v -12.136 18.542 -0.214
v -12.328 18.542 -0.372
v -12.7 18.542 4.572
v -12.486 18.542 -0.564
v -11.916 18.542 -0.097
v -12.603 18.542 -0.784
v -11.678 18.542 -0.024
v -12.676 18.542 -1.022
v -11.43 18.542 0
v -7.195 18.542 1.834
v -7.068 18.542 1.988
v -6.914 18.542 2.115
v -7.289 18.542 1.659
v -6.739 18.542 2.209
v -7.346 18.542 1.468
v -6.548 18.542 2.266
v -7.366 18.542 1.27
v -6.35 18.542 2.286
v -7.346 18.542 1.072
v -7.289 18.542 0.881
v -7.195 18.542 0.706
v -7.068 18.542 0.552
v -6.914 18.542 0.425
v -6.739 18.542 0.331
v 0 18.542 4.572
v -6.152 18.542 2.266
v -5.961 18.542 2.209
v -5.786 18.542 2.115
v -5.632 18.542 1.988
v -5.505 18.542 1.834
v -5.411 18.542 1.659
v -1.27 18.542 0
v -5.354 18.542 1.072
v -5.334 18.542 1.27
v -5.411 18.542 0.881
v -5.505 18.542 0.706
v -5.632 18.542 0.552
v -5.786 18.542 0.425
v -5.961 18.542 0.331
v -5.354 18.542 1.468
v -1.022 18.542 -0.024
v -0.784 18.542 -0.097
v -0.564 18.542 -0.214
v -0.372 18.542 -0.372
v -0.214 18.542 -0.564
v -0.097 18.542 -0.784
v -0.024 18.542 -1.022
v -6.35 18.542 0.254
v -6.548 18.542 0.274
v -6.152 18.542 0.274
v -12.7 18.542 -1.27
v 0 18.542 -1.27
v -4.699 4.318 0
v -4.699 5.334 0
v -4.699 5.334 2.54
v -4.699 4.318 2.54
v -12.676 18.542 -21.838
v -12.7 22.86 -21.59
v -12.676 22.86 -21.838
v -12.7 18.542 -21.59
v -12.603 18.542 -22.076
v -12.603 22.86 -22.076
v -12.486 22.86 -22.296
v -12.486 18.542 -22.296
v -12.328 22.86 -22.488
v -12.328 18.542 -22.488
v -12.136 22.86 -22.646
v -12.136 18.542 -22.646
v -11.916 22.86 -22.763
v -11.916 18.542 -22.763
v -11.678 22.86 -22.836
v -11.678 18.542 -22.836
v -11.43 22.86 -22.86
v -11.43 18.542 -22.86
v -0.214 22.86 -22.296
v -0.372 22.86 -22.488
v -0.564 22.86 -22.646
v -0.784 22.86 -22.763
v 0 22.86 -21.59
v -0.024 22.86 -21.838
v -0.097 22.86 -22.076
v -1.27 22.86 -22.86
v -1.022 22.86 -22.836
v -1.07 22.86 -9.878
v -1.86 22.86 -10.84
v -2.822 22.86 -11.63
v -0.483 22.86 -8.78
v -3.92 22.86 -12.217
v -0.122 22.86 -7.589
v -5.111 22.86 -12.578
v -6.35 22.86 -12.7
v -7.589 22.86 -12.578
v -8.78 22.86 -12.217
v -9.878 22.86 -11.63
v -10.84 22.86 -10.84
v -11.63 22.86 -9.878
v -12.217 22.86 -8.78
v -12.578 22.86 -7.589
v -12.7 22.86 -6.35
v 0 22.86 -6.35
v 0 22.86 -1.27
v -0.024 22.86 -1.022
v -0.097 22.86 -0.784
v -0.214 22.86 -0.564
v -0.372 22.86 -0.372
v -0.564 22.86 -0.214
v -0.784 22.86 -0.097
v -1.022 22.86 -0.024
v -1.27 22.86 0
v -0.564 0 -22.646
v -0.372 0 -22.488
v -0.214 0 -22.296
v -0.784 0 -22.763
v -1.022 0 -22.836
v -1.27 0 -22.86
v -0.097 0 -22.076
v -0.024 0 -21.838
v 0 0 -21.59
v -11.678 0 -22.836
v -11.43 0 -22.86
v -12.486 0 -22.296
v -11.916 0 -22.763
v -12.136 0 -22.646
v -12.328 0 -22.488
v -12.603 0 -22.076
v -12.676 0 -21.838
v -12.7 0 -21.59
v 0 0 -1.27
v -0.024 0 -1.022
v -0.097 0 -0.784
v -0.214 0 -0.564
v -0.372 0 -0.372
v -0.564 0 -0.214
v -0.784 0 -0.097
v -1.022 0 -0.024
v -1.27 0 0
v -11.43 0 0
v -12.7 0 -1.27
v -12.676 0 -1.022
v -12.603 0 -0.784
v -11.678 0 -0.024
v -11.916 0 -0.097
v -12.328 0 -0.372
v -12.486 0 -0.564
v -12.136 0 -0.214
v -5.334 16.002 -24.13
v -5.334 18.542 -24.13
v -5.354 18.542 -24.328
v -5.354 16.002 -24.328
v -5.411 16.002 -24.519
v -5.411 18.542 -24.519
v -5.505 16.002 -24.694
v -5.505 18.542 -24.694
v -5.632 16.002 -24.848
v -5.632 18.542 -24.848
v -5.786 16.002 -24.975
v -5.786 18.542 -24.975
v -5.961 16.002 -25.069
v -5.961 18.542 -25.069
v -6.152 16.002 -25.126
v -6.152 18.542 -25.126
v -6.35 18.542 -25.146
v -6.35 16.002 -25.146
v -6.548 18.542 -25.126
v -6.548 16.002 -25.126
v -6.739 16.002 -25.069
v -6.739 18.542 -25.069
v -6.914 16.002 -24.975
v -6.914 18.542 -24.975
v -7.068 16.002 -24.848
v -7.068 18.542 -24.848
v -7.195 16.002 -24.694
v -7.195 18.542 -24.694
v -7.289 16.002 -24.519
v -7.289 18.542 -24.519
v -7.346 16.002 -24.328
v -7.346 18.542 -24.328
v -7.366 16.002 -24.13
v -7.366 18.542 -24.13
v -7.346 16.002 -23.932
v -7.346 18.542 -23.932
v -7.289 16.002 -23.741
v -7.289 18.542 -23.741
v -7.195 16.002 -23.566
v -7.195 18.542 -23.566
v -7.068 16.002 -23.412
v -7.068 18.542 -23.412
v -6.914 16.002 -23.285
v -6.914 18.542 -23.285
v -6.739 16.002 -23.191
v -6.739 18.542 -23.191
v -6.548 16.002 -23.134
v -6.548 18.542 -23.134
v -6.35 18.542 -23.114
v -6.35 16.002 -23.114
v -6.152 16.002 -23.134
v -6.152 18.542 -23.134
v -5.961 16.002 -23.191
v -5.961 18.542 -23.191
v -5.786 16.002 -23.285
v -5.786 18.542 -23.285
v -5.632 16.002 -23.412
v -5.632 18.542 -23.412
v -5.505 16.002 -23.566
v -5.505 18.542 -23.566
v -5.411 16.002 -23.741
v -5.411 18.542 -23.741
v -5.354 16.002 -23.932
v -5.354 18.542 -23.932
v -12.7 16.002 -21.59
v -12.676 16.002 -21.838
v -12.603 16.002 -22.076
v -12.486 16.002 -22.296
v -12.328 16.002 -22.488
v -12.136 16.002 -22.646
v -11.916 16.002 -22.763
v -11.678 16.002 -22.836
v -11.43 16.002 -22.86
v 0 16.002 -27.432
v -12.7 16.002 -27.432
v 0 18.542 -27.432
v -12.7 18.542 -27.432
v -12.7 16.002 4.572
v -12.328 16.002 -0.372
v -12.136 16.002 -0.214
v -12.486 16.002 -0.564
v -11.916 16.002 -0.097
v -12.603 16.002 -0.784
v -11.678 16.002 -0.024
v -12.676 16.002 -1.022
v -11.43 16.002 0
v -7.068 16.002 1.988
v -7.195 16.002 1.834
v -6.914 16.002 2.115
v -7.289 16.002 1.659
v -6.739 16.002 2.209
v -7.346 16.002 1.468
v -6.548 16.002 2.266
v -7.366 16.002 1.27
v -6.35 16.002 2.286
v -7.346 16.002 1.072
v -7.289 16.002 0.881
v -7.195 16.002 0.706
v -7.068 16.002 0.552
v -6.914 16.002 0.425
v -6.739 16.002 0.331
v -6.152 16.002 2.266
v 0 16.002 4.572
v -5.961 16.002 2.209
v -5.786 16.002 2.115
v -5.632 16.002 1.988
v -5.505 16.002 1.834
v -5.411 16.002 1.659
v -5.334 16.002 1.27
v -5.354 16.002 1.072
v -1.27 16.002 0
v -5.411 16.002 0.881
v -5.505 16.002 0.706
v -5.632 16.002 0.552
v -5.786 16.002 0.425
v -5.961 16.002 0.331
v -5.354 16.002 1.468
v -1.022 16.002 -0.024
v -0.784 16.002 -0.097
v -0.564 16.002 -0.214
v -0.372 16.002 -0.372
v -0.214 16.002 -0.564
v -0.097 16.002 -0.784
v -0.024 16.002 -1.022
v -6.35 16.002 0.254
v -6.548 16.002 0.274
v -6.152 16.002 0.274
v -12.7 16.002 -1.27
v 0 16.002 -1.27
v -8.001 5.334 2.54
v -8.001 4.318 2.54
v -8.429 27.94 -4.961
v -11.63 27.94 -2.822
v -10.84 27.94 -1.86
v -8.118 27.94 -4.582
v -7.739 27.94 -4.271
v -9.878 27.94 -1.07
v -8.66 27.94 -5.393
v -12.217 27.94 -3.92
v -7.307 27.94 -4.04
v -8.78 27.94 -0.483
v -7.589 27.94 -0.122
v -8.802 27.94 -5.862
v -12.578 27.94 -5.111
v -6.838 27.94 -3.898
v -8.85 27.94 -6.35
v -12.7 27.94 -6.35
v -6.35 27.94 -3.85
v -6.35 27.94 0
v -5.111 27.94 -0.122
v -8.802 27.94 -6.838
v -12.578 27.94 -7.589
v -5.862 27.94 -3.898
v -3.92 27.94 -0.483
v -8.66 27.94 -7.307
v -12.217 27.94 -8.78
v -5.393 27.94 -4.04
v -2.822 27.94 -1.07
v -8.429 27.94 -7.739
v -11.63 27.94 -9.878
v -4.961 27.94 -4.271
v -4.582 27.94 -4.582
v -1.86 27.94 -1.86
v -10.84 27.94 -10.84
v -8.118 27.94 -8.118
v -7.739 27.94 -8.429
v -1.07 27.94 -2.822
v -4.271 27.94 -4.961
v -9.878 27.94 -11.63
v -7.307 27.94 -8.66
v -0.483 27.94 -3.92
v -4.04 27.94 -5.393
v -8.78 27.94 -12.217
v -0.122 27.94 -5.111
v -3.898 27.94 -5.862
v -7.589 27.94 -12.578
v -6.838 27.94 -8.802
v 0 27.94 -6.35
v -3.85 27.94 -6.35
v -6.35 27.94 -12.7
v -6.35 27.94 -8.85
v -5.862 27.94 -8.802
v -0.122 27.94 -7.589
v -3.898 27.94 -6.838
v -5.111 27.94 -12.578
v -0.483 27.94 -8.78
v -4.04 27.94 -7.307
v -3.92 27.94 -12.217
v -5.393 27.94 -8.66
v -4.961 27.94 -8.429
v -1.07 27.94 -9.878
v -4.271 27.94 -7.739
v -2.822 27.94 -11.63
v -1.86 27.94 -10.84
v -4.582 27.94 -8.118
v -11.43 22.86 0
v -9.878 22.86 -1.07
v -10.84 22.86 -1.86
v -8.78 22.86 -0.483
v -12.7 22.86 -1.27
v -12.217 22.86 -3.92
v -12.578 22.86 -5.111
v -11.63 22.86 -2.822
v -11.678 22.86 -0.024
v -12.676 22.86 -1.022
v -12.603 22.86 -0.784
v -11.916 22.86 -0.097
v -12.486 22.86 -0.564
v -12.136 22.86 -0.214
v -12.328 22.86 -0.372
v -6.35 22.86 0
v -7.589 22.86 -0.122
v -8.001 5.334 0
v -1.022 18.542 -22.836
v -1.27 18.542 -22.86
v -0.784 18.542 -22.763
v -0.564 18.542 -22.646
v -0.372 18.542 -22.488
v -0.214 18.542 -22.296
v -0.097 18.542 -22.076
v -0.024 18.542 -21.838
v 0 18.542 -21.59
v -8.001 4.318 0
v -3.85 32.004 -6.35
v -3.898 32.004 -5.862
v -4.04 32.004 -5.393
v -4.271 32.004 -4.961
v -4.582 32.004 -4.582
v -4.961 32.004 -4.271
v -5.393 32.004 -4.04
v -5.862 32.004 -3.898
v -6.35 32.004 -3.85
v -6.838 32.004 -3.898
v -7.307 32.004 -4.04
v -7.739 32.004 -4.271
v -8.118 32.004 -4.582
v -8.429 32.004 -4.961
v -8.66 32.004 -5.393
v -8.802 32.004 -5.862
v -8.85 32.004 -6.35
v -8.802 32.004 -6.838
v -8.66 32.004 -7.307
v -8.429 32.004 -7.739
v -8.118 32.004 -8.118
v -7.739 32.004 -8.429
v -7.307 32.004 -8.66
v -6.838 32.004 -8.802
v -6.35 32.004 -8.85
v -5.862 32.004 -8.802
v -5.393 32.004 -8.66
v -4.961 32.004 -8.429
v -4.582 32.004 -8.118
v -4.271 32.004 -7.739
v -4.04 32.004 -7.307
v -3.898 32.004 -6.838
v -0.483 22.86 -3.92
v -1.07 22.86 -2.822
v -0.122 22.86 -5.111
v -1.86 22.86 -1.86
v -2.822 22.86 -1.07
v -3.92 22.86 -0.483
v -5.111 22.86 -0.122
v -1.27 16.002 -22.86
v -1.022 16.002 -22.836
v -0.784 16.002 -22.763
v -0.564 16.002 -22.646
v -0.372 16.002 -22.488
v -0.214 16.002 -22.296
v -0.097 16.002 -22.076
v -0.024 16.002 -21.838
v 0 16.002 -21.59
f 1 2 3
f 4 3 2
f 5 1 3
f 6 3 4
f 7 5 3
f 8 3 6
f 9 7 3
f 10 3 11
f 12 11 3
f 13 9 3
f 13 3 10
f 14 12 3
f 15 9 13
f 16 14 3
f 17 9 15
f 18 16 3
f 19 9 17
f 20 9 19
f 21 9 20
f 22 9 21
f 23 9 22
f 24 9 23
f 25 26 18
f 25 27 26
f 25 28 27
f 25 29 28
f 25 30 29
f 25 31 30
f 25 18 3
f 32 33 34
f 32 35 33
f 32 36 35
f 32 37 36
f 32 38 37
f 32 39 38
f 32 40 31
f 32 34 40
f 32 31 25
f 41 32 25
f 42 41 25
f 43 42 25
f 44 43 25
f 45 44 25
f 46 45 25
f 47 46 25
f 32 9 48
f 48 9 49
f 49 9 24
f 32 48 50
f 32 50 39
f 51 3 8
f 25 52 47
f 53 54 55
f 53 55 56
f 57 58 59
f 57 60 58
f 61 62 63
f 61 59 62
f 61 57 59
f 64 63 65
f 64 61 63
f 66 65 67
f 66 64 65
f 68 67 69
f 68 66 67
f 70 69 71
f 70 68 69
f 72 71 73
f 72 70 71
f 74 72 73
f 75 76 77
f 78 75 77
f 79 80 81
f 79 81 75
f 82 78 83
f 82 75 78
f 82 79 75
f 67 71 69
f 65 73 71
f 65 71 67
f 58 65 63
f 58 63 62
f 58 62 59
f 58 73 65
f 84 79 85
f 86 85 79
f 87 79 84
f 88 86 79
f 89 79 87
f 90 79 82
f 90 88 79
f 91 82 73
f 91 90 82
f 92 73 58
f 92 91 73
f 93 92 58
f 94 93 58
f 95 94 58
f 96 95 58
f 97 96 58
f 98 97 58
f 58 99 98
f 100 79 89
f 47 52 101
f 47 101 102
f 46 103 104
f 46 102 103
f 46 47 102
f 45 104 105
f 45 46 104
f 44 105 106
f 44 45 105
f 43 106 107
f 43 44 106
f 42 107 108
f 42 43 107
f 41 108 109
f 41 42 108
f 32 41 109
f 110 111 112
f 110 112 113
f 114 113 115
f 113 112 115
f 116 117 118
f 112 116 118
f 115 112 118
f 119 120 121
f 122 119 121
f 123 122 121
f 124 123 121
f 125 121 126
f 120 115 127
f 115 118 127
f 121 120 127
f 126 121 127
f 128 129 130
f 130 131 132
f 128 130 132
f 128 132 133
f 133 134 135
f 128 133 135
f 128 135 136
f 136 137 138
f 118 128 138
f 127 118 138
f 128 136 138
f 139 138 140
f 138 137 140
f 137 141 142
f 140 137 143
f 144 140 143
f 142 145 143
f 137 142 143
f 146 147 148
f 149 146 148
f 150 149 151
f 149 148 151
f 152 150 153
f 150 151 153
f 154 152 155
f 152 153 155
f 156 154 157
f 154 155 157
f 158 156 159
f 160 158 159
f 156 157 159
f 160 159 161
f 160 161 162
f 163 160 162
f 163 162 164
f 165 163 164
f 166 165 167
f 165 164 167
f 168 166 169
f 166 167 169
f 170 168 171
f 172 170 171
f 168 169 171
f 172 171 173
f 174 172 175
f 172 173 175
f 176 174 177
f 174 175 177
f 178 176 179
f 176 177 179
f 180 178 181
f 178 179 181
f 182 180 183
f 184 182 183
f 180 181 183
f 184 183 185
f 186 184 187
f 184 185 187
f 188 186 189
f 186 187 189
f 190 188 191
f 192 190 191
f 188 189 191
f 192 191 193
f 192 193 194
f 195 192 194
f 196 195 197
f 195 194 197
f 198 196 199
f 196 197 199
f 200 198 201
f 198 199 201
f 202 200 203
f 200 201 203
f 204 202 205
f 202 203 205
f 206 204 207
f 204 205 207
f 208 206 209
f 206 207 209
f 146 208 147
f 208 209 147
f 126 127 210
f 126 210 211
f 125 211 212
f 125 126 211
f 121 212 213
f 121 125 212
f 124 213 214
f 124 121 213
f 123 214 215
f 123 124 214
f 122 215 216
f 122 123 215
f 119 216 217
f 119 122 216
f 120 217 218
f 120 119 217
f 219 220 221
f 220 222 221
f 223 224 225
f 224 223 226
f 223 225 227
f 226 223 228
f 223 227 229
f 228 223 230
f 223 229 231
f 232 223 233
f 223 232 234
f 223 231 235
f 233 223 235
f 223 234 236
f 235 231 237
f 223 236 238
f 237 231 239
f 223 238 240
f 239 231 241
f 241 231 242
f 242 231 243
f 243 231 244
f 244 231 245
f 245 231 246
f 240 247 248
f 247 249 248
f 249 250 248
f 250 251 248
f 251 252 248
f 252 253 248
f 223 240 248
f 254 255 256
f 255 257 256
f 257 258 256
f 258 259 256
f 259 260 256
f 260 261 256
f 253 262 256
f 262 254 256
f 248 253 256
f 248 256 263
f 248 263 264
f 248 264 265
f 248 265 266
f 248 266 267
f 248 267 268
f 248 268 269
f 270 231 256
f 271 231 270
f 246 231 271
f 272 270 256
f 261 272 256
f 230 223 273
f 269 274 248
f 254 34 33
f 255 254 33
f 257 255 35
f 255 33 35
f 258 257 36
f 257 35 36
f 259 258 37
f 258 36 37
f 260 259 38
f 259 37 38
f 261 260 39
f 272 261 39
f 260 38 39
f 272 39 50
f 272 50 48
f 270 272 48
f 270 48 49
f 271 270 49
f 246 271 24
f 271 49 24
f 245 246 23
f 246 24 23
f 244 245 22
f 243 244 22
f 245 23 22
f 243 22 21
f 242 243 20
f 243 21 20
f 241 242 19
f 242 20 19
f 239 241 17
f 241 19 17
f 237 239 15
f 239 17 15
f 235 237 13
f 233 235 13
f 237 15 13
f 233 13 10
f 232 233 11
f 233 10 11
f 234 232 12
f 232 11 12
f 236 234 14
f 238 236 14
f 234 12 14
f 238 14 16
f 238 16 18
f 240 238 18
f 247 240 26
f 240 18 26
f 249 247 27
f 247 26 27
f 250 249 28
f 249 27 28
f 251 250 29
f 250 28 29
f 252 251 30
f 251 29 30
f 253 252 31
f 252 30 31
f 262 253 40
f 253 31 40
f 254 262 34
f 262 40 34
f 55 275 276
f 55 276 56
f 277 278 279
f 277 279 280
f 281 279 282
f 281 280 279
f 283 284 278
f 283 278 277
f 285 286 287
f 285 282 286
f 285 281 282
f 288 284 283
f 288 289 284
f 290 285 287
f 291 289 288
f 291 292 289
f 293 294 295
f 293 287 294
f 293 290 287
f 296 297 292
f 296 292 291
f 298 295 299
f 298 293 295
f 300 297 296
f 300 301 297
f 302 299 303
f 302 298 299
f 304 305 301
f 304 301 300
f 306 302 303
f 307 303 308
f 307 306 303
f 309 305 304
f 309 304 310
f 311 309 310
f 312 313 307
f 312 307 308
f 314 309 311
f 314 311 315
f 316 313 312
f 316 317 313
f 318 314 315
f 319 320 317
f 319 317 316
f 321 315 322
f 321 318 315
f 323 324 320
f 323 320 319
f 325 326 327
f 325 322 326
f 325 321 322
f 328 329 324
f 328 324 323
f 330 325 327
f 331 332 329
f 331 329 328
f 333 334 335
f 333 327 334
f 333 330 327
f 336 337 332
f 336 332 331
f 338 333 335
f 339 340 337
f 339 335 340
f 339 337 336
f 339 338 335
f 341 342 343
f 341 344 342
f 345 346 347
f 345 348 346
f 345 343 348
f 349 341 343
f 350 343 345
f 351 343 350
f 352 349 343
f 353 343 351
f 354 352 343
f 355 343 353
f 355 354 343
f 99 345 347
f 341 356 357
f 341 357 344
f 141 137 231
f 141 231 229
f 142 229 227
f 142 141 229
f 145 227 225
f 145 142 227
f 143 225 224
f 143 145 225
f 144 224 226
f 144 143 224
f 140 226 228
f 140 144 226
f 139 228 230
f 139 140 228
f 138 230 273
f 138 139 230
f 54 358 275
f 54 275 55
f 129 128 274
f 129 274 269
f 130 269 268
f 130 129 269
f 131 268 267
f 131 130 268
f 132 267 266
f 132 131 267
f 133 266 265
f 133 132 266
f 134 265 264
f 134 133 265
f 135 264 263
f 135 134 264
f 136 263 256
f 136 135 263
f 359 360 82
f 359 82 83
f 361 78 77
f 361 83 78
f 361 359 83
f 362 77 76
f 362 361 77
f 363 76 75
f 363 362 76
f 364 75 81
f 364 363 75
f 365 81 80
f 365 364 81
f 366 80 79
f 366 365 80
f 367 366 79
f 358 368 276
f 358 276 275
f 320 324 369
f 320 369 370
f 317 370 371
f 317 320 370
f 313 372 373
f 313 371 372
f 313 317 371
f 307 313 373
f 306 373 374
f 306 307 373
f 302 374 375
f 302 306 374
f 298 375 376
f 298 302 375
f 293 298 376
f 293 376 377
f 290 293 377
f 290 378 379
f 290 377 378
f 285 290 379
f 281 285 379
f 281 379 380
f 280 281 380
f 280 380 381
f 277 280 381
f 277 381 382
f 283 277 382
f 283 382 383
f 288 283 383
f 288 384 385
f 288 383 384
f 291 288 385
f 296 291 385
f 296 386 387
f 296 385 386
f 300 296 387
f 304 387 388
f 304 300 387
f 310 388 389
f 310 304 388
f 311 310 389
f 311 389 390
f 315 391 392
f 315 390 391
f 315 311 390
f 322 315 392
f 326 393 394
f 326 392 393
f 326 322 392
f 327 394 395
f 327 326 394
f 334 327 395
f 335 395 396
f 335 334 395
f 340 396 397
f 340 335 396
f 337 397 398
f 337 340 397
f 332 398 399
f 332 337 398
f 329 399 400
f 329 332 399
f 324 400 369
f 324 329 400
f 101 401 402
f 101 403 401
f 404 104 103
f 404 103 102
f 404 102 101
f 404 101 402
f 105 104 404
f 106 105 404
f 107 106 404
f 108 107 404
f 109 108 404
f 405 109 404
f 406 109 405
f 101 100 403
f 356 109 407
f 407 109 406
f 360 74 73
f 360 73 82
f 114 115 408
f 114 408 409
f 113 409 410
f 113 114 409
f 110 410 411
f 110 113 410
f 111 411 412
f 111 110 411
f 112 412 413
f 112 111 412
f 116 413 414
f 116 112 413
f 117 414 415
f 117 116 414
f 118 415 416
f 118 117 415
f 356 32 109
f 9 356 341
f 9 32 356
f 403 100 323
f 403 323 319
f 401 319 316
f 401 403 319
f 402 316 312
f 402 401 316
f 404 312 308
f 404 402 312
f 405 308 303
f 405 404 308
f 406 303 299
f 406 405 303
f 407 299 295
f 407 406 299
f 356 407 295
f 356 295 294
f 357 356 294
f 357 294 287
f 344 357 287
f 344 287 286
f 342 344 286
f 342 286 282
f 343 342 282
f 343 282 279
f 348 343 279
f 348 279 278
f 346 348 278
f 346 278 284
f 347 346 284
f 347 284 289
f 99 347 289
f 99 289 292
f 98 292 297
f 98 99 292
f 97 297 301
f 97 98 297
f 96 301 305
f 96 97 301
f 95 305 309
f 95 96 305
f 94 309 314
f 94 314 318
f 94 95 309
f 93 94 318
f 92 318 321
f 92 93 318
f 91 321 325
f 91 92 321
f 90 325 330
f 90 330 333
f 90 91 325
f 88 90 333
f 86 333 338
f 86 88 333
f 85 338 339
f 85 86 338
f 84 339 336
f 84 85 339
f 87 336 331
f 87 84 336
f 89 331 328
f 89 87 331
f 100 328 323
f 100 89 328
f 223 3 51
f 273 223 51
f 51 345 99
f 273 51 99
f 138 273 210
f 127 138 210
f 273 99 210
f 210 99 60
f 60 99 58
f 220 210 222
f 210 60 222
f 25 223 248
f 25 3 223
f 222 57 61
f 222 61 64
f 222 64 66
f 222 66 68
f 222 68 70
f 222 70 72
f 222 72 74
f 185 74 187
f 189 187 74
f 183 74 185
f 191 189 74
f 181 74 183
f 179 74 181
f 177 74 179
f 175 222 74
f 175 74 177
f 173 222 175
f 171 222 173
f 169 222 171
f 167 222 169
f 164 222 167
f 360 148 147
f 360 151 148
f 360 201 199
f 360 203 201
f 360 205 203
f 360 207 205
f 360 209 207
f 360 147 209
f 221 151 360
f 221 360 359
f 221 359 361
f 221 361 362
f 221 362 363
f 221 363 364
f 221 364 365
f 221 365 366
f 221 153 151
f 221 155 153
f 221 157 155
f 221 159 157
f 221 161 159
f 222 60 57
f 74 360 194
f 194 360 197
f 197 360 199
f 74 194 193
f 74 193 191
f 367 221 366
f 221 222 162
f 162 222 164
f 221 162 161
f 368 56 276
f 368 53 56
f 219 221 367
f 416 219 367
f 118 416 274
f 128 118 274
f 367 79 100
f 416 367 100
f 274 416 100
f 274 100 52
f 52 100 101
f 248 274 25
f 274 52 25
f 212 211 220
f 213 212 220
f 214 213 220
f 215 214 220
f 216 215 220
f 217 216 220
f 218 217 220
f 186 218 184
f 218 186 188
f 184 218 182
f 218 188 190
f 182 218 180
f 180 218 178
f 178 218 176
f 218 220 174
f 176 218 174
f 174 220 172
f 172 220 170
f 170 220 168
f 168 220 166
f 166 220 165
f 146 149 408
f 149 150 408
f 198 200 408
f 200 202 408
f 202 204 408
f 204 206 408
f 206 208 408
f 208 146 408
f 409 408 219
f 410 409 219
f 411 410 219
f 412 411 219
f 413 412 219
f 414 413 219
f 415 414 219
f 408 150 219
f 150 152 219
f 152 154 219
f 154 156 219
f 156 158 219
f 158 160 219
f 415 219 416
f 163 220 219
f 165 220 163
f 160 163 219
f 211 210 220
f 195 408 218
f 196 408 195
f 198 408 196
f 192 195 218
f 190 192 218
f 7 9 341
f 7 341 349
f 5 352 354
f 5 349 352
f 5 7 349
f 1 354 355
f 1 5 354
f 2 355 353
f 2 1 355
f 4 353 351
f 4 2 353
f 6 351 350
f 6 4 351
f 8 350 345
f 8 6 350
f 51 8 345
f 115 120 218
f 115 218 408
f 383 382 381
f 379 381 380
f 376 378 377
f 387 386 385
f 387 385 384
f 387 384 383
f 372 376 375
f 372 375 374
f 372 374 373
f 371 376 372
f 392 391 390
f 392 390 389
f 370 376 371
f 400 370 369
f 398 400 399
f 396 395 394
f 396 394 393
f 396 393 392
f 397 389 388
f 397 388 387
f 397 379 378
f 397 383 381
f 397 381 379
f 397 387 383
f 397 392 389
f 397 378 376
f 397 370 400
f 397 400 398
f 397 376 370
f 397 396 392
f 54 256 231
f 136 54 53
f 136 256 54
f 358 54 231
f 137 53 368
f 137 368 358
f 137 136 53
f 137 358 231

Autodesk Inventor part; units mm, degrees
ref_plane "YZ Plane" through (0, 0, 0) normal (1, 0, 0) x (0, 1, 0)
ref_plane "XZ Plane" through (0, 0, 0) normal (0, 1, 0) x (-1, 0, 0)
sketch "Sketch1" plane through (0, 0, 0) normal (0, 1, 0) x (-1, 0, 0)
  line L0 (1.27, 0) -> (11.43, 0)
  line L1 (12.7, -1.27) -> (12.7, -21.59)
  line L2 (11.43, -22.86) -> (1.27, -22.86)
  line L3 (0, -21.59) -> (0, -1.27)
  arc A0 (12.7, -1.27) -> (11.43, 0) centre (11.43, -1.27) ccw
  arc A1 (1.27, 0) -> (0, -1.27) centre (1.27, -1.27) ccw
  arc A2 (0, -21.59) -> (1.27, -22.86) centre (1.27, -21.59) ccw
  arc A3 (11.43, -22.86) -> (12.7, -21.59) centre (11.43, -21.59) ccw
  point P0 (0, 0)
  point P1 (12.7, -22.86)
  point P2 (12.7, 0)
  point P3 (0, -22.86)
  dimension "d0" = 12.7
  dimension "d1" = 22.86
  dimension "d2" = 1.27
extrude "Extrusion1" add sketch "Sketch1" along normal blind 22.86
sketch "Sketch2" plane through (0, 22.86, 0) normal (0, 1, 0) x (1, 0, 0)
  line L0 (-12.7, 21.59) -> (-12.7, 1.27) projected
  line L1 (-11.43, 0) -> (-1.27, 0) projected
  line L2 (0, 1.27) -> (0, 21.59) projected
  circle A0 centre (-6.35, 6.35) radius 6.35
  point P0 (0, 0)
extrude "Extrusion2" add sketch "Sketch2" along normal blind 5.08
ref_plane "Work Plane1" through (0, 18.542, 0) normal (0, 1, 0) x (1, 0, 0)
sketch "Sketch5" plane through (0, 18.542, 0) normal (0, 1, 0) x (1, 0, 0)
  line L0 (-12.7, 27.432) -> (0, 27.432)
  line L1 (-12.7, 21.59) -> (-12.7, 1.27) projected
  line L2 (0, 1.27) -> (0, 21.59) projected
  circle A0 centre (-6.35, 24.13) radius 1.016
  line L3 (0, 11.43) -> (-12.7, 11.43) construction
  line L4 (-12.7, -4.572) -> (0, -4.572)
  circle A1 centre (-6.35, -1.27) radius 1.016
  line L5 (-12.7, -4.572) -> (-12.7, 27.432)
  line L6 (0, 27.432) -> (0, -4.572)
  point P0 (0, 0)
  dimension "d13" = 16.002
  dimension "d14" = 2.032
  dimension "d15" = 25.4
extrude "Extrusion4" add sketch "Sketch5" against normal blind 2.54
sketch "Sketch6" plane through (-11.43, 0, 0) normal (0, 0, 1) x (1, 0, 0)
  line L0 (3.429, 5.334) -> (6.731, 5.334)
  line L1 (6.731, 5.334) -> (6.731, 4.318)
  line L2 (6.731, 4.318) -> (3.429, 4.318)
  line L3 (3.429, 4.318) -> (3.429, 5.334)
  line L4 (0, 0) -> (10.16, 0) projected
  point P0 (11.43, 0)
  point P1 (5.08, 0)
  point P2 (5.08, 4.318)
  dimension "d18" = 3.302
  dimension "d19" = 1.016
  dimension "d20" = 4.318
extrude "Extrusion5" add sketch "Sketch6" along normal blind 2.54
sketch "Sketch7" plane through (-6.35, 27.94, -6.35) normal (0, 1, 0) x (1, 0, 0)
  circle A0 centre (0, 0) radius 2.5
  point P0 (6.35, -6.35)
  dimension "d23" = 5
extrude "Extrusion6" add sketch "Sketch7" along normal blind 4.064
properties part number "Servo_With_Attachment"
